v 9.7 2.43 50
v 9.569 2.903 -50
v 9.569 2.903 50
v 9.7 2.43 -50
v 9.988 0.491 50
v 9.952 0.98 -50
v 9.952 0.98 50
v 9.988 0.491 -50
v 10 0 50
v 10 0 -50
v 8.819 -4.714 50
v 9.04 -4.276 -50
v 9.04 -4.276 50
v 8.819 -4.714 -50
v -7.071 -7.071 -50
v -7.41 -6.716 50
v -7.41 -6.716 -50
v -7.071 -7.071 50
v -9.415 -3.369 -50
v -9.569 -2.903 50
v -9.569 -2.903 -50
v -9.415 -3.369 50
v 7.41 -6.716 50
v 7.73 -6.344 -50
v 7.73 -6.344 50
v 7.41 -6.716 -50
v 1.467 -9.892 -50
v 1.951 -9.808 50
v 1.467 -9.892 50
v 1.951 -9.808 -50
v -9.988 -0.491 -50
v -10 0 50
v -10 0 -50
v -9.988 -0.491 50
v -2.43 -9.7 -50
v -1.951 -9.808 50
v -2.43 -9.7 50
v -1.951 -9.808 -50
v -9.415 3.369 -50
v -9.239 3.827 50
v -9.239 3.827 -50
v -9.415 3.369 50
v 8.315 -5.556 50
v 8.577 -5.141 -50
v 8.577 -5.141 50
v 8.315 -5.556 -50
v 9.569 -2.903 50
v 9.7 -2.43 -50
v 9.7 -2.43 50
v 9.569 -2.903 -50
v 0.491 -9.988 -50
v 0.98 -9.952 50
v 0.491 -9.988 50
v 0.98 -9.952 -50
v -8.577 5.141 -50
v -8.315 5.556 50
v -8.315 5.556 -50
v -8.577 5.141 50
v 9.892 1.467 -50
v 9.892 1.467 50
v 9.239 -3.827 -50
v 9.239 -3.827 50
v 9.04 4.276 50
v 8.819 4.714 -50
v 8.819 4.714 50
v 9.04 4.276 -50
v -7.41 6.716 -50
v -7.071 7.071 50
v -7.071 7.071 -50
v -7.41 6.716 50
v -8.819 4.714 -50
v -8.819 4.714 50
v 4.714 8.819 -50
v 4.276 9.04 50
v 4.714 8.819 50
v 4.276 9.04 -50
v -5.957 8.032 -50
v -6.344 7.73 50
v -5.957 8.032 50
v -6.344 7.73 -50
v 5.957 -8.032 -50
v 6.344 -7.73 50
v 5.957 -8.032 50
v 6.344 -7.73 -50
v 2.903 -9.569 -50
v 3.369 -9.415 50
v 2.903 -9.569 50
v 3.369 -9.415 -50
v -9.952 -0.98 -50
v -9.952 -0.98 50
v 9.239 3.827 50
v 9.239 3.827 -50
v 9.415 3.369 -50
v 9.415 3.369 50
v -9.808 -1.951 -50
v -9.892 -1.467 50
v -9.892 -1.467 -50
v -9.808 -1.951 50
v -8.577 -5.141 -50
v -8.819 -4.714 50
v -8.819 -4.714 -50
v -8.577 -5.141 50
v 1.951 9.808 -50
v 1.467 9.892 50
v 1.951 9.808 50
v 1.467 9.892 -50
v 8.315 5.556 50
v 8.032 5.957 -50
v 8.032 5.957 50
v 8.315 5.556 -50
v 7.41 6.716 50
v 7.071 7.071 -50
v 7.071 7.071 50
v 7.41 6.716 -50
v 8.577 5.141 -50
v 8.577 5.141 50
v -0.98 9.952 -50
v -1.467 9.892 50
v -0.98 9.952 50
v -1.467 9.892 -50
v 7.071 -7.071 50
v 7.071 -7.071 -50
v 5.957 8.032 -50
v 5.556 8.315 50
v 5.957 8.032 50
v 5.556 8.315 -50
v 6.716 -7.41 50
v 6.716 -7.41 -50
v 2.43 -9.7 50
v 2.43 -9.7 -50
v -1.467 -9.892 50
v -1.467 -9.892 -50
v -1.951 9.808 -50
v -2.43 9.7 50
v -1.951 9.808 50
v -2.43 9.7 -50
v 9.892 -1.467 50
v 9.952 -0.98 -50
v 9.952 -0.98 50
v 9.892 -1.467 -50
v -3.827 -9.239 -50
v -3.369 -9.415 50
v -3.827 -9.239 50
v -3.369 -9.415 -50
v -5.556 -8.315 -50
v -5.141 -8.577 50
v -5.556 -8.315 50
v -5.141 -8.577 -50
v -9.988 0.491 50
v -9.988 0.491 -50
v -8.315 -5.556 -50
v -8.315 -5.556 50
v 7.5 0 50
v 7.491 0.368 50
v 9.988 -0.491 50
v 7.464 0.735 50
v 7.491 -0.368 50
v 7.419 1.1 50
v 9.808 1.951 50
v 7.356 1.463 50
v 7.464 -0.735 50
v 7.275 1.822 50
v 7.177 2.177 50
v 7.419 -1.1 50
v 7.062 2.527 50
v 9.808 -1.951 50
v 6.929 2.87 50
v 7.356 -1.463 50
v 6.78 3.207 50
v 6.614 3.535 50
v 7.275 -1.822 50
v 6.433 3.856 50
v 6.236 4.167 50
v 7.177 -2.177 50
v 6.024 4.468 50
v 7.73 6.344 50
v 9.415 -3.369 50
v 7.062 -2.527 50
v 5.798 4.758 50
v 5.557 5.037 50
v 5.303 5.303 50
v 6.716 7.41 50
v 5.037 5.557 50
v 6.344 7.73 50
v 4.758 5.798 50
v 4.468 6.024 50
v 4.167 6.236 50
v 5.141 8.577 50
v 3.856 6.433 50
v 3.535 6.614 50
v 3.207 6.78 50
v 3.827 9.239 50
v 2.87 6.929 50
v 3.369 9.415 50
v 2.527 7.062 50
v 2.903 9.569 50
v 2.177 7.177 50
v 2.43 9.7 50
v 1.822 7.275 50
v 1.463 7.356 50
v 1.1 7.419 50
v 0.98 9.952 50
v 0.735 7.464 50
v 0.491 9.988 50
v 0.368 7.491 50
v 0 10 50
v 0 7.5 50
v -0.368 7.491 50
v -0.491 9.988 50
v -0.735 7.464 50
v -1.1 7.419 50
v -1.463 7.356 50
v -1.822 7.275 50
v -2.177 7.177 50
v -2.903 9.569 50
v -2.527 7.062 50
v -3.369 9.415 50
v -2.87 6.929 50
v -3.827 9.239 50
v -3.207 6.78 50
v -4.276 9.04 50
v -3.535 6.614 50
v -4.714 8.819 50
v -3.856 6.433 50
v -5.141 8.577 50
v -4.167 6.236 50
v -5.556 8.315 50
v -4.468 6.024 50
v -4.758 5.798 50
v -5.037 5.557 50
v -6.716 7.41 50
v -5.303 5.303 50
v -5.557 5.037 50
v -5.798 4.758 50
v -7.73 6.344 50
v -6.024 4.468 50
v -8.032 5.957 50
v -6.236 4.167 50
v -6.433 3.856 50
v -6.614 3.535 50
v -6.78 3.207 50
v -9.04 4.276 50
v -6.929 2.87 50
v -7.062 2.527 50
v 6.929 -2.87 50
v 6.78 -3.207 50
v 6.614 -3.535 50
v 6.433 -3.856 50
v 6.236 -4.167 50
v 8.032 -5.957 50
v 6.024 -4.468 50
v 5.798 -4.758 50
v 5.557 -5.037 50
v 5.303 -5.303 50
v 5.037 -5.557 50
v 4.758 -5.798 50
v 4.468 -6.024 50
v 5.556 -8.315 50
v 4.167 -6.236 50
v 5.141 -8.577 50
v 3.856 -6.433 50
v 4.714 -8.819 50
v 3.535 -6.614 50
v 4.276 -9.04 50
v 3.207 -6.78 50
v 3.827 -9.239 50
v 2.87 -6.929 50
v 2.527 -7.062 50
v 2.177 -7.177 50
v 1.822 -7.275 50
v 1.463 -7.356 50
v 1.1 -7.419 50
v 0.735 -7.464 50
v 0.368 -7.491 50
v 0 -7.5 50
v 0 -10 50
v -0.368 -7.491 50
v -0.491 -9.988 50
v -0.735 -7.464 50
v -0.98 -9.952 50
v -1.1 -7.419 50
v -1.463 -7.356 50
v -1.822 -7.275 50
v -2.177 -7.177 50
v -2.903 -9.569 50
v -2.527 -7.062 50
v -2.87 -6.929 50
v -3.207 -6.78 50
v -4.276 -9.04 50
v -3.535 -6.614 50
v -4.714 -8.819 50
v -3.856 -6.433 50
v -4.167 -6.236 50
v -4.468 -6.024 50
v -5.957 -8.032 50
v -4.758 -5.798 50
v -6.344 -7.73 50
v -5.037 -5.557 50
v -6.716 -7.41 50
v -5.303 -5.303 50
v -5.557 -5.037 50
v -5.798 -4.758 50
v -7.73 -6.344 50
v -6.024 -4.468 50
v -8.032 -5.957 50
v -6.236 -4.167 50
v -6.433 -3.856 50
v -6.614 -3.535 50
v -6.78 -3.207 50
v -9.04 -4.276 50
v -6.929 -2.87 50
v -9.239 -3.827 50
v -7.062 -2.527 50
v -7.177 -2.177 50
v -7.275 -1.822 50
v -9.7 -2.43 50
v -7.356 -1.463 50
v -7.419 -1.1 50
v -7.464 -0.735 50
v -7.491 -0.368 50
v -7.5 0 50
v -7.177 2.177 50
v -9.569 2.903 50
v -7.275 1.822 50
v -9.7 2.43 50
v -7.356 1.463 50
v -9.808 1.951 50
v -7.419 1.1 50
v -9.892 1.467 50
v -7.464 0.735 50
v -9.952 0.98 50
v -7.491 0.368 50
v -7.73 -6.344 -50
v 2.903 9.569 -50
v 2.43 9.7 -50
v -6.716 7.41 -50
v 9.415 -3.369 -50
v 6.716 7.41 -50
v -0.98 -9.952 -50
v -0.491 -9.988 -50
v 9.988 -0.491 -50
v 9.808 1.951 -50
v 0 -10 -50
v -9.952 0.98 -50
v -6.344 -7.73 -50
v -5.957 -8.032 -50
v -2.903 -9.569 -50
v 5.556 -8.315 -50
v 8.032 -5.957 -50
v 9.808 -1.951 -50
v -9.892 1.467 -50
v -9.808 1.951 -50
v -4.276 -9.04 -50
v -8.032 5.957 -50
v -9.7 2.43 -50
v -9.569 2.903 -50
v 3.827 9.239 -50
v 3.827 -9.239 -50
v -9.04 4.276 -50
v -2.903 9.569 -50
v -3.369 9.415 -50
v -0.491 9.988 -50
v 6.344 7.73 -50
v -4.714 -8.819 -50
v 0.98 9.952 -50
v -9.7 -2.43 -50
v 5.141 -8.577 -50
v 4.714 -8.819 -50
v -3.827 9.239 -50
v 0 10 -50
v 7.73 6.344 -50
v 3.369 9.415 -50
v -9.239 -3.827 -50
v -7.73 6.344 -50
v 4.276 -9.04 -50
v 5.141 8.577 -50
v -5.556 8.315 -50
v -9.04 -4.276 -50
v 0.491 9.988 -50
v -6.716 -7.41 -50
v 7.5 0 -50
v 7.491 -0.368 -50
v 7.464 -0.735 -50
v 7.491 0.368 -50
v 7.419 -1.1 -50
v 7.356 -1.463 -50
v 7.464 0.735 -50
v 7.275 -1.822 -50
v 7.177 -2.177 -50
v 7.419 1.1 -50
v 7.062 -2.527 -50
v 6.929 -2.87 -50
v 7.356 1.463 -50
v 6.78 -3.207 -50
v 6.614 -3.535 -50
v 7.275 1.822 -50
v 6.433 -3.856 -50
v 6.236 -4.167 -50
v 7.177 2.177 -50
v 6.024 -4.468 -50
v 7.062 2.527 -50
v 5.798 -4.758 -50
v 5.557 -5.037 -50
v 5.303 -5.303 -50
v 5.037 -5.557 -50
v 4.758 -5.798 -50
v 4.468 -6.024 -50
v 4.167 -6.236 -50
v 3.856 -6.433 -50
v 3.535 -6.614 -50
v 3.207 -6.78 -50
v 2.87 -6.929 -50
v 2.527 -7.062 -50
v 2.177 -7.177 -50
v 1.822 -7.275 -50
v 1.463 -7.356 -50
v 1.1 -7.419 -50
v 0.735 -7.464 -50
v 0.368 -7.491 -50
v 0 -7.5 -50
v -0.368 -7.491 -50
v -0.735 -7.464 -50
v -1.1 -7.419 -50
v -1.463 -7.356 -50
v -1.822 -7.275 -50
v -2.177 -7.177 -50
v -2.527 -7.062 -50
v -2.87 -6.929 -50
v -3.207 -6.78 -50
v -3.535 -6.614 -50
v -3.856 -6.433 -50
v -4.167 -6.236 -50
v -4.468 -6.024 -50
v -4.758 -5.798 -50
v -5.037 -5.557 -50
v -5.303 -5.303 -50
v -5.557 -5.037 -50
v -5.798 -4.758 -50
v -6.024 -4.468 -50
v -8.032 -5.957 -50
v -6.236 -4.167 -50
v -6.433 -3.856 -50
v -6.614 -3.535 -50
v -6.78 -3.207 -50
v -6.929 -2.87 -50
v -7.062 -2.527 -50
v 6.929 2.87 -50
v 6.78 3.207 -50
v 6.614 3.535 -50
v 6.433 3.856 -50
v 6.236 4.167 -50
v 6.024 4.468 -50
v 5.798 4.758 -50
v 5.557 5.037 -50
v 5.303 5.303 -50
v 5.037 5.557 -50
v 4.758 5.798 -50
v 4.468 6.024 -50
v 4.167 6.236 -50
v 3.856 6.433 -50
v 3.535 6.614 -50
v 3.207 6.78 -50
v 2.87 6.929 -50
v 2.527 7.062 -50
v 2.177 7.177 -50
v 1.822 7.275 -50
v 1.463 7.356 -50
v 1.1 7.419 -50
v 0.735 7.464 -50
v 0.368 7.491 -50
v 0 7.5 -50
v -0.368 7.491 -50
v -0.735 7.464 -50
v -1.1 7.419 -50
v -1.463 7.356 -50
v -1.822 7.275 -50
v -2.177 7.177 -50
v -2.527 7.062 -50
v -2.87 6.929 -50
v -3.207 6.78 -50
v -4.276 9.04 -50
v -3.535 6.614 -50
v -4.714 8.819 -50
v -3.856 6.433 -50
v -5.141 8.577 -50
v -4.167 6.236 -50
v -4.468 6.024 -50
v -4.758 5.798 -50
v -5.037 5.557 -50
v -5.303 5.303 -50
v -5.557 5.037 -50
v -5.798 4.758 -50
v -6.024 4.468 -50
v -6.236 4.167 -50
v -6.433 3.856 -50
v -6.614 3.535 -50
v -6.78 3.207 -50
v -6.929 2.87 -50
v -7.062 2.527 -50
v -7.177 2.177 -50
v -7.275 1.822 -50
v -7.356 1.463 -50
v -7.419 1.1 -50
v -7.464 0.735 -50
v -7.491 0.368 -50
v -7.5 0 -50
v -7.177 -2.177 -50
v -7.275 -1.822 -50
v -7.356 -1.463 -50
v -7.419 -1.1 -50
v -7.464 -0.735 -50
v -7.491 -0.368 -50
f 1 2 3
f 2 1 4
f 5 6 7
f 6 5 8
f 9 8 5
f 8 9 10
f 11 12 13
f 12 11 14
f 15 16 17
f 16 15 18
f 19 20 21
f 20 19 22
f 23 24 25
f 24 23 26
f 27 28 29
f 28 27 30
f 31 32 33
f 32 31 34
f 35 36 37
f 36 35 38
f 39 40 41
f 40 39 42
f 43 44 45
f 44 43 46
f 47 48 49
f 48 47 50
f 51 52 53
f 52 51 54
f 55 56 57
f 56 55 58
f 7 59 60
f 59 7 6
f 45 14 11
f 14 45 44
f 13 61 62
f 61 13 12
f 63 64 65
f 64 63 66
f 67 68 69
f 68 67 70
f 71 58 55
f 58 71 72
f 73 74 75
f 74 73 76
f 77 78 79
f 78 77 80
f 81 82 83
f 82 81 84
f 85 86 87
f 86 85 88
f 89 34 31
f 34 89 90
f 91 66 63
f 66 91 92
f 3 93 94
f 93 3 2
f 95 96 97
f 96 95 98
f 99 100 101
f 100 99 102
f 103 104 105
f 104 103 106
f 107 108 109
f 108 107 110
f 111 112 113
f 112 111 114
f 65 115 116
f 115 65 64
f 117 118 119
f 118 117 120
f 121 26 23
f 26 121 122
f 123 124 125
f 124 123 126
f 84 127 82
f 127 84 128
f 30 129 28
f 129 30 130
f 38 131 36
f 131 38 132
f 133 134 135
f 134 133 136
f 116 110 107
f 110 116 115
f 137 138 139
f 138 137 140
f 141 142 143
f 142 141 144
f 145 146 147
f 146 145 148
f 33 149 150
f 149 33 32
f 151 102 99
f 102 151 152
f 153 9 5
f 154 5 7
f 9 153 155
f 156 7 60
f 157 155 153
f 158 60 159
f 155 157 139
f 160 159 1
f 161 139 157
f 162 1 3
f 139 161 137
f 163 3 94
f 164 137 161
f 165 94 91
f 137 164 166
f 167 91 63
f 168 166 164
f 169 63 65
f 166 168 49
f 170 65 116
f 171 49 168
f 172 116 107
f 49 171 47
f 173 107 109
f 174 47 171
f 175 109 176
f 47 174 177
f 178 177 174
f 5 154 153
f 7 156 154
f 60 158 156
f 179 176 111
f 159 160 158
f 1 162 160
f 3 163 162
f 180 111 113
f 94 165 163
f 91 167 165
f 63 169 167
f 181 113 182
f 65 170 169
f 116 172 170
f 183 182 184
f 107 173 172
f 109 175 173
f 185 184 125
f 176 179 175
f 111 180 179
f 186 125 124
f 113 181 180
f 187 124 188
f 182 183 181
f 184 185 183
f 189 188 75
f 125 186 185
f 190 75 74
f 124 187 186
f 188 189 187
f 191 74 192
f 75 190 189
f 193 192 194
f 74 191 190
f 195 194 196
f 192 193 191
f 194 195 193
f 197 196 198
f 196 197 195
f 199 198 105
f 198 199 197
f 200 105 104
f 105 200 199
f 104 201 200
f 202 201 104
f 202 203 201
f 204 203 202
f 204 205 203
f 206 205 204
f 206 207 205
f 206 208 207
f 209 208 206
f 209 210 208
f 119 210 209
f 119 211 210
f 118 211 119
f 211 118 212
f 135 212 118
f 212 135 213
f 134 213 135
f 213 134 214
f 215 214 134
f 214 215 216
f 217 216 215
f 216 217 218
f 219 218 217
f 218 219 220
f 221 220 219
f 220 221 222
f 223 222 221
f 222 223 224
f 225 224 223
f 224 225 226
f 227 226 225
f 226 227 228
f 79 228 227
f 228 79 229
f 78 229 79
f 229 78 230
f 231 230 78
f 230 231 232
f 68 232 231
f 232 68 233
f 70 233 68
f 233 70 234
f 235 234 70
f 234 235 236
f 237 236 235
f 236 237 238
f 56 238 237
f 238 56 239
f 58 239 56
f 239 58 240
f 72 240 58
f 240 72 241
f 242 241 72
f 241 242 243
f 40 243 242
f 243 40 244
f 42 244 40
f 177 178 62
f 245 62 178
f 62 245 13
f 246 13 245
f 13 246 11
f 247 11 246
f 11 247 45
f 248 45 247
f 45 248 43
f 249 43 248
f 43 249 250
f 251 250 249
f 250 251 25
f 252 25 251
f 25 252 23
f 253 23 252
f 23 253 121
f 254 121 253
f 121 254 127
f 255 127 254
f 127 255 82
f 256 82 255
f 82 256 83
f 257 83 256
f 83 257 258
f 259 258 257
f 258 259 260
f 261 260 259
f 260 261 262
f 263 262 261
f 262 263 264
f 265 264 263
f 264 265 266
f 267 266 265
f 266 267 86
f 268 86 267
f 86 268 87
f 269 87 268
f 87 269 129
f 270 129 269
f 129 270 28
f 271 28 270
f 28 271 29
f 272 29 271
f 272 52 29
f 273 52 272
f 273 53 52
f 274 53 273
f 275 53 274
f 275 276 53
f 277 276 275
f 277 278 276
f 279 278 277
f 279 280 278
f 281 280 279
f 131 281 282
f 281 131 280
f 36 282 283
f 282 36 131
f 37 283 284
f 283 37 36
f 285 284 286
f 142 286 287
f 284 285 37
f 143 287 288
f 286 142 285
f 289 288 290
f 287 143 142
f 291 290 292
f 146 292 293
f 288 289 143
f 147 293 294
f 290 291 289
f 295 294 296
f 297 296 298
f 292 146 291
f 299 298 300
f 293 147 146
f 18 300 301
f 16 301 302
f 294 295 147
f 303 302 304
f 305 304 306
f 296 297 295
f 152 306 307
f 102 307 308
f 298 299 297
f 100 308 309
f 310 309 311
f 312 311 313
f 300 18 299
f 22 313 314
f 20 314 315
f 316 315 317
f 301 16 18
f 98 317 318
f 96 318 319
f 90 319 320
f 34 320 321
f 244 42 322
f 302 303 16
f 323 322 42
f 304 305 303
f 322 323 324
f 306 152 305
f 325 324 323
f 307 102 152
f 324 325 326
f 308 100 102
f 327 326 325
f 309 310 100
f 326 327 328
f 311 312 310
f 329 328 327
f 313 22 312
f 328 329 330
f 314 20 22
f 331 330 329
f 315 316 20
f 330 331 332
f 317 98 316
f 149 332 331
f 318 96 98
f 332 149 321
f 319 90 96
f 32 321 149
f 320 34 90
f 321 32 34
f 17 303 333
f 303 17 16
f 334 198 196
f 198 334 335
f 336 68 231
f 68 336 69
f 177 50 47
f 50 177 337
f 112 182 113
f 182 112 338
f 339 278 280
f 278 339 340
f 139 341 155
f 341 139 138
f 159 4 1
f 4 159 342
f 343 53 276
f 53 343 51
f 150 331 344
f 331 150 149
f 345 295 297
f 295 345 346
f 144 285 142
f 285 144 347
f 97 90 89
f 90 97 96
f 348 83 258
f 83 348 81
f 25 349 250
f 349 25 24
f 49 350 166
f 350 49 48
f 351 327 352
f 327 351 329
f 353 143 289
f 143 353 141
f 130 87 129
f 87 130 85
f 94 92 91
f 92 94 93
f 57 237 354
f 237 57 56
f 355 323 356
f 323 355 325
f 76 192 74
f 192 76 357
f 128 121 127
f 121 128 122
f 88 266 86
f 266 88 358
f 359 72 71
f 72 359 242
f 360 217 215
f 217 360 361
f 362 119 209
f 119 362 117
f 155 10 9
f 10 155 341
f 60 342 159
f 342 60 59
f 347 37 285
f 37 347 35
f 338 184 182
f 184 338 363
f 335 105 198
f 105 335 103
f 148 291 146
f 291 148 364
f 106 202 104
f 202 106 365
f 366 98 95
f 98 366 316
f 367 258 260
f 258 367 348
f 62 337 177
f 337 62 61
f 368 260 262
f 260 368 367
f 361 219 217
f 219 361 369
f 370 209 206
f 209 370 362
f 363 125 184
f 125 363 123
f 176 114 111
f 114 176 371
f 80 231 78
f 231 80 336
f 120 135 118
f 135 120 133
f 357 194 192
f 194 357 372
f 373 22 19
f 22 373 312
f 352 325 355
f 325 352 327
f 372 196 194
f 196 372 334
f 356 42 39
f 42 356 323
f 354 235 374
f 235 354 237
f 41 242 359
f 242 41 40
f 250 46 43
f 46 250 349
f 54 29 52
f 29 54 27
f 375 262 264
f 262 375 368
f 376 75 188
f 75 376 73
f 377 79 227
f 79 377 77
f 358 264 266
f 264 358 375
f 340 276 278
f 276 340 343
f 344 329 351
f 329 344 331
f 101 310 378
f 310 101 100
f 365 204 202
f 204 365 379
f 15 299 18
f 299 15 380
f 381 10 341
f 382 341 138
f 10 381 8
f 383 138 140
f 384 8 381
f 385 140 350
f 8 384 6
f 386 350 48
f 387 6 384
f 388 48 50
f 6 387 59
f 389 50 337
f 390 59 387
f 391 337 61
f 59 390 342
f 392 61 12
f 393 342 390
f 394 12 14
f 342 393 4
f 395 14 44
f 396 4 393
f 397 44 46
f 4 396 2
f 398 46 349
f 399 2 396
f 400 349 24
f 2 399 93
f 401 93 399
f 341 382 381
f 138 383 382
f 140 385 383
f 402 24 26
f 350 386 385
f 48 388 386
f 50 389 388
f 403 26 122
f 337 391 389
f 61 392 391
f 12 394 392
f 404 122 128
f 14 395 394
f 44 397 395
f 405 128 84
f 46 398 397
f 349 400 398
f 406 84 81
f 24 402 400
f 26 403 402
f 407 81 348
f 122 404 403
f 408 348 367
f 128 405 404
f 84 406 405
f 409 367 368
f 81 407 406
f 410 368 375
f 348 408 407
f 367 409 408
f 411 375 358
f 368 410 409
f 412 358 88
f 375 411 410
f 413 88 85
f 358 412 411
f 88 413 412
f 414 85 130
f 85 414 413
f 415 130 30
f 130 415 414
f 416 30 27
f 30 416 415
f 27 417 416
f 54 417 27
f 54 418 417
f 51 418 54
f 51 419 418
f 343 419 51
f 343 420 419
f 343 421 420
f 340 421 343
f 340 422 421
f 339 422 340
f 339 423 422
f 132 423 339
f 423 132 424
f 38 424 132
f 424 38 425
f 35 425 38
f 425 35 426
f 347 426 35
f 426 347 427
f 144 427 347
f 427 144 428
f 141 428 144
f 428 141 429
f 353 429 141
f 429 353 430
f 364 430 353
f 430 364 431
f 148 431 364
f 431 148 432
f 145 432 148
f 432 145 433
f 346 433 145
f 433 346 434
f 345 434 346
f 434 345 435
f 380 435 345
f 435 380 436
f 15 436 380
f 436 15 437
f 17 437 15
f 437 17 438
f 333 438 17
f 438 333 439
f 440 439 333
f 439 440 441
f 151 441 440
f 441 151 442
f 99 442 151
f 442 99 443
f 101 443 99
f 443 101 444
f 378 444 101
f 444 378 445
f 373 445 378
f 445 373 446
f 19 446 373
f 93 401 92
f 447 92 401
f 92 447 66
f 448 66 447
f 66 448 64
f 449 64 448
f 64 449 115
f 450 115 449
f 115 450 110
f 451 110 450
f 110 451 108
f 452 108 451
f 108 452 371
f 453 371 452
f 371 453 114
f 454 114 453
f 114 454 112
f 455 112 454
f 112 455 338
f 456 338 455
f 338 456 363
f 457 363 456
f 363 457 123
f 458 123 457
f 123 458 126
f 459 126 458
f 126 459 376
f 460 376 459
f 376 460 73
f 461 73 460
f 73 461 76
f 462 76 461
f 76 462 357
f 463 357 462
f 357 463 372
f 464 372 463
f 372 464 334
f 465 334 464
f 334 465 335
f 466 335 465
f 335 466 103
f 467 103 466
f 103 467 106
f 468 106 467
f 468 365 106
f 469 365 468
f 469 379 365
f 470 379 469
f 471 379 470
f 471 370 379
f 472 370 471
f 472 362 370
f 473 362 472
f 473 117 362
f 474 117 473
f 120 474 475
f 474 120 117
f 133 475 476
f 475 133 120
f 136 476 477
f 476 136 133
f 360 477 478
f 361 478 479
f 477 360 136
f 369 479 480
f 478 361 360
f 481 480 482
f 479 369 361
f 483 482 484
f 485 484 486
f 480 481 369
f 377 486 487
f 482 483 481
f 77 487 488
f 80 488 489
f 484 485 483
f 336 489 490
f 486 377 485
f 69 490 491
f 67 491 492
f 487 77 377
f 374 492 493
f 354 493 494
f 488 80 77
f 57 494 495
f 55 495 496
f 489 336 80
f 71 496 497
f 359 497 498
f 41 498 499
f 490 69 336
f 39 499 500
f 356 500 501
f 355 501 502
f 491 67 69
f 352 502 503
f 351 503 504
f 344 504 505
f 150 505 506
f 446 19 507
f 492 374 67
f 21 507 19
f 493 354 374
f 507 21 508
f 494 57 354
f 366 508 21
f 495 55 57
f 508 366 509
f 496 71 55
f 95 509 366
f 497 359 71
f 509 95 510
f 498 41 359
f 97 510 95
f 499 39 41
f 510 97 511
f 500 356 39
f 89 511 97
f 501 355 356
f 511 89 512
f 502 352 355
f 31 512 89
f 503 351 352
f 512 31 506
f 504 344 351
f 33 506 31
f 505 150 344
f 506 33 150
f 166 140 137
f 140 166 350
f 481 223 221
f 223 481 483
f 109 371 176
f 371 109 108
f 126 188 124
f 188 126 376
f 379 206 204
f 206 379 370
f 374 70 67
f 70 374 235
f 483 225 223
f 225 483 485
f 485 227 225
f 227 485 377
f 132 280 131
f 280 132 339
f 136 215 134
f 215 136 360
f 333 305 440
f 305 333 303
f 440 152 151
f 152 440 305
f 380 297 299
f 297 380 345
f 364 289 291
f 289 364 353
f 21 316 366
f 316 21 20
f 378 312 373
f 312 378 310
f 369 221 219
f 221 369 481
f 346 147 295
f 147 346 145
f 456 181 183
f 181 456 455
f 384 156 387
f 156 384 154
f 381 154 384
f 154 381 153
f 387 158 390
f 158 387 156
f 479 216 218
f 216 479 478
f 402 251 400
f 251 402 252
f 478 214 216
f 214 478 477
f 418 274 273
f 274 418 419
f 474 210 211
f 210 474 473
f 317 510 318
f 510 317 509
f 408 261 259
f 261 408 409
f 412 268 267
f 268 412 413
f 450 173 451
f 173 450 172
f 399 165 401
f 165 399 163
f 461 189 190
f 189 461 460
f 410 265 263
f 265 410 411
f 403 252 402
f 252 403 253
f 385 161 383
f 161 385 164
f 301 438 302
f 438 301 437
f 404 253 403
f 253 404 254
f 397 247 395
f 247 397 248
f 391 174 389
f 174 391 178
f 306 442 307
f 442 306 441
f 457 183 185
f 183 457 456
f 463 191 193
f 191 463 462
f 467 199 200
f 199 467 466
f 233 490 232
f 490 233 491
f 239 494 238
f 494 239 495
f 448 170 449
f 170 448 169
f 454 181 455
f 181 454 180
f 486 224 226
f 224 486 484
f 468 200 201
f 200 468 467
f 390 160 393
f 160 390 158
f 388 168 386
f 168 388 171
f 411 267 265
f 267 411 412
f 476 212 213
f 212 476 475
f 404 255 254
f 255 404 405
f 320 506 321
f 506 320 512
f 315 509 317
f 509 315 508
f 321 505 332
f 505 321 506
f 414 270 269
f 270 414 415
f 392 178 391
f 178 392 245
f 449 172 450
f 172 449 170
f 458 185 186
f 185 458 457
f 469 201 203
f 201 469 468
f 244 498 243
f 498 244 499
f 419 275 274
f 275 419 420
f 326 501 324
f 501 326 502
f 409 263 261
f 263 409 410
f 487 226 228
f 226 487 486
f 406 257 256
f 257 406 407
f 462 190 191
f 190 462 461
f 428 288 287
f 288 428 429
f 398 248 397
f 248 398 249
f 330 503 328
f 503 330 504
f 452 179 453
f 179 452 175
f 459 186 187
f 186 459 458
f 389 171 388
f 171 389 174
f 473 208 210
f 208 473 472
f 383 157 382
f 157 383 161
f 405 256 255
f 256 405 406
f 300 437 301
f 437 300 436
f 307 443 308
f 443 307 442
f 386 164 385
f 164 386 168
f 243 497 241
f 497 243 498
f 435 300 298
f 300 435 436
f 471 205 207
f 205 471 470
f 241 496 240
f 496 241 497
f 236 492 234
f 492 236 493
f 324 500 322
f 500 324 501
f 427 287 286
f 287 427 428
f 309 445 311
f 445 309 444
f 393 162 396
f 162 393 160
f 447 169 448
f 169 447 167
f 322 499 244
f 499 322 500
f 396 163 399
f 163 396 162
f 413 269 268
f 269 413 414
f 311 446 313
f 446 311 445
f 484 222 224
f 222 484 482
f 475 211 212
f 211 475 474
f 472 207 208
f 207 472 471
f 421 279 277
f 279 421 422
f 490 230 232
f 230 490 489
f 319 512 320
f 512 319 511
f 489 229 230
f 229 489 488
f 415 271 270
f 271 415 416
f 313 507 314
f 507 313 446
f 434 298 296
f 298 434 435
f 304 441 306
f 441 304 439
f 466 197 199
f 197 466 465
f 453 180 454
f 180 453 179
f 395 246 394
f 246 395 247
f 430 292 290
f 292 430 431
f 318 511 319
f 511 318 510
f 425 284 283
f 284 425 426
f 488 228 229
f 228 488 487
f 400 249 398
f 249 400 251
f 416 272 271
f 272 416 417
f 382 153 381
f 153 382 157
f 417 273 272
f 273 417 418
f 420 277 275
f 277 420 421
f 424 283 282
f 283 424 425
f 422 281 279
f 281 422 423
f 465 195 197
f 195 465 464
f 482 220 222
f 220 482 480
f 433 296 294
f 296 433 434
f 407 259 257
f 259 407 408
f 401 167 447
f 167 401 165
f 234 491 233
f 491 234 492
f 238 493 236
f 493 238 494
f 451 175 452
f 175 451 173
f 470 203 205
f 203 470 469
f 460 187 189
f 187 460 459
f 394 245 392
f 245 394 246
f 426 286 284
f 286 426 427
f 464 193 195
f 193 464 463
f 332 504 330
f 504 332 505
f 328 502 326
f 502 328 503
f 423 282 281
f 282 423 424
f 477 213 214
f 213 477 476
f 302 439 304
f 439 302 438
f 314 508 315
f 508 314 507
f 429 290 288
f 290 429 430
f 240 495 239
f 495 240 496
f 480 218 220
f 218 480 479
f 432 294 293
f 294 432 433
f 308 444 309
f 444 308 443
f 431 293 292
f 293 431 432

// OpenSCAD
$fn = 128;

module tubing(OD, ID, length, centered=false) {
    eps = 0.05;

    // Robust, non-empty geometry
    OD2 = max(OD, eps);
    ID2 = min(max(ID, 0), OD2 - 2*eps);
    L   = max(length, eps);

    // Place tube either centered at origin or sitting on Z=0
    zc = centered ? 0 : L/2;

    translate([0, 0, zc])
    difference() {
        cylinder(d=OD2, h=L, center=true);
        // Slightly longer inner cut ensures a clean through-bore
        cylinder(d=ID2, h=L + 2*eps, center=true);
    }
}

// Example: neoprene tubing
tubing(20, 15, 100, centered=true);
